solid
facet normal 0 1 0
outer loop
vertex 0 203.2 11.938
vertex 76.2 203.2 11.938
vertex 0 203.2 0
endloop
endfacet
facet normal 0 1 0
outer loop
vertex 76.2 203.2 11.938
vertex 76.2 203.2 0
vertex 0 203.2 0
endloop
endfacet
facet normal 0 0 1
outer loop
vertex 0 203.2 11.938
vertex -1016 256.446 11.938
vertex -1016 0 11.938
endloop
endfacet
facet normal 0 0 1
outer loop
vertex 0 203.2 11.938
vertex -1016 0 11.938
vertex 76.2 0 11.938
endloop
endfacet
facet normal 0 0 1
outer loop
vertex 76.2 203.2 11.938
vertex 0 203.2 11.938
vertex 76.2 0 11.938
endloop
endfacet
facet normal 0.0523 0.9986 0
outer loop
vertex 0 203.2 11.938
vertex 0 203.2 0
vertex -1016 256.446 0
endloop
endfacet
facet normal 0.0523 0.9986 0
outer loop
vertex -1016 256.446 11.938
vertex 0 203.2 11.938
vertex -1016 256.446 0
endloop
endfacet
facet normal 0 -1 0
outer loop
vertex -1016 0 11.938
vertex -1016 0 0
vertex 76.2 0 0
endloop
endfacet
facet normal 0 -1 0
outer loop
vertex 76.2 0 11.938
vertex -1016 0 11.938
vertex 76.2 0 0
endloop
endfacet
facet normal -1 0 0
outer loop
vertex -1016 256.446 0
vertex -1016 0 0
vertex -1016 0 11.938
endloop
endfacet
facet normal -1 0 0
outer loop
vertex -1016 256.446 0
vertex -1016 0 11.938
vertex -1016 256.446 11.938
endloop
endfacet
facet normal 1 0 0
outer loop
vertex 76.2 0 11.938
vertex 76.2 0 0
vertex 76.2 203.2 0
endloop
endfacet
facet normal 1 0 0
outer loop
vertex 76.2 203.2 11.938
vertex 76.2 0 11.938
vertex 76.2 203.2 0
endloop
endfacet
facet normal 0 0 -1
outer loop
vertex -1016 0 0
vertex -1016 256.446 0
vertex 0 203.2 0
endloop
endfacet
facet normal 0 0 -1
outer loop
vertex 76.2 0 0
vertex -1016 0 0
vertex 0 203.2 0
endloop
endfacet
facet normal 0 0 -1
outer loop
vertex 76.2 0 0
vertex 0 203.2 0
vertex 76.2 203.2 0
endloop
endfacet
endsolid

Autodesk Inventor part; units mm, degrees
ref_plane "YZ Plane" through (0, 0, 0) normal (1, 0, 0) x (0, 1, 0)
ref_plane "XZ Plane" through (0, 0, 0) normal (0, 1, 0) x (-1, 0, 0)
ref_plane "XY Plane" through (0, 0, 0) normal (0, 0, 1) x (1, 0, 0)
sketch "Sketch1" plane through (0, 0, 0) normal (0, 0, 1) x (1, 0, 0)
  line L0 (0, 0) -> (76.2, 0)
  line L1 (76.2, 0) -> (76.2, 203.2)
  line L2 (76.2, 203.2) -> (0, 203.2)
  line L3 (0, 203.2) -> (0, 0)
  line L4 (0, 203.2) -> (-406.4, 203.2) construction
  line L5 (0, 203.2) -> (-1016, 256.4463)
  line L6 (0, 0) -> (-1016, 0)
  line L7 (-1016, 0) -> (-1016, 256.4463)
  dimension "d0" = 203.2
  dimension "d1" = 76.2
  dimension "d2" = 3
  dimension "d3" = 1016
extrude "Extrusion1" add sketch "Sketch1" along normal blind 11.938
properties part number "Outlet Support Leg Proto 1" material "Wood (Oak)"
